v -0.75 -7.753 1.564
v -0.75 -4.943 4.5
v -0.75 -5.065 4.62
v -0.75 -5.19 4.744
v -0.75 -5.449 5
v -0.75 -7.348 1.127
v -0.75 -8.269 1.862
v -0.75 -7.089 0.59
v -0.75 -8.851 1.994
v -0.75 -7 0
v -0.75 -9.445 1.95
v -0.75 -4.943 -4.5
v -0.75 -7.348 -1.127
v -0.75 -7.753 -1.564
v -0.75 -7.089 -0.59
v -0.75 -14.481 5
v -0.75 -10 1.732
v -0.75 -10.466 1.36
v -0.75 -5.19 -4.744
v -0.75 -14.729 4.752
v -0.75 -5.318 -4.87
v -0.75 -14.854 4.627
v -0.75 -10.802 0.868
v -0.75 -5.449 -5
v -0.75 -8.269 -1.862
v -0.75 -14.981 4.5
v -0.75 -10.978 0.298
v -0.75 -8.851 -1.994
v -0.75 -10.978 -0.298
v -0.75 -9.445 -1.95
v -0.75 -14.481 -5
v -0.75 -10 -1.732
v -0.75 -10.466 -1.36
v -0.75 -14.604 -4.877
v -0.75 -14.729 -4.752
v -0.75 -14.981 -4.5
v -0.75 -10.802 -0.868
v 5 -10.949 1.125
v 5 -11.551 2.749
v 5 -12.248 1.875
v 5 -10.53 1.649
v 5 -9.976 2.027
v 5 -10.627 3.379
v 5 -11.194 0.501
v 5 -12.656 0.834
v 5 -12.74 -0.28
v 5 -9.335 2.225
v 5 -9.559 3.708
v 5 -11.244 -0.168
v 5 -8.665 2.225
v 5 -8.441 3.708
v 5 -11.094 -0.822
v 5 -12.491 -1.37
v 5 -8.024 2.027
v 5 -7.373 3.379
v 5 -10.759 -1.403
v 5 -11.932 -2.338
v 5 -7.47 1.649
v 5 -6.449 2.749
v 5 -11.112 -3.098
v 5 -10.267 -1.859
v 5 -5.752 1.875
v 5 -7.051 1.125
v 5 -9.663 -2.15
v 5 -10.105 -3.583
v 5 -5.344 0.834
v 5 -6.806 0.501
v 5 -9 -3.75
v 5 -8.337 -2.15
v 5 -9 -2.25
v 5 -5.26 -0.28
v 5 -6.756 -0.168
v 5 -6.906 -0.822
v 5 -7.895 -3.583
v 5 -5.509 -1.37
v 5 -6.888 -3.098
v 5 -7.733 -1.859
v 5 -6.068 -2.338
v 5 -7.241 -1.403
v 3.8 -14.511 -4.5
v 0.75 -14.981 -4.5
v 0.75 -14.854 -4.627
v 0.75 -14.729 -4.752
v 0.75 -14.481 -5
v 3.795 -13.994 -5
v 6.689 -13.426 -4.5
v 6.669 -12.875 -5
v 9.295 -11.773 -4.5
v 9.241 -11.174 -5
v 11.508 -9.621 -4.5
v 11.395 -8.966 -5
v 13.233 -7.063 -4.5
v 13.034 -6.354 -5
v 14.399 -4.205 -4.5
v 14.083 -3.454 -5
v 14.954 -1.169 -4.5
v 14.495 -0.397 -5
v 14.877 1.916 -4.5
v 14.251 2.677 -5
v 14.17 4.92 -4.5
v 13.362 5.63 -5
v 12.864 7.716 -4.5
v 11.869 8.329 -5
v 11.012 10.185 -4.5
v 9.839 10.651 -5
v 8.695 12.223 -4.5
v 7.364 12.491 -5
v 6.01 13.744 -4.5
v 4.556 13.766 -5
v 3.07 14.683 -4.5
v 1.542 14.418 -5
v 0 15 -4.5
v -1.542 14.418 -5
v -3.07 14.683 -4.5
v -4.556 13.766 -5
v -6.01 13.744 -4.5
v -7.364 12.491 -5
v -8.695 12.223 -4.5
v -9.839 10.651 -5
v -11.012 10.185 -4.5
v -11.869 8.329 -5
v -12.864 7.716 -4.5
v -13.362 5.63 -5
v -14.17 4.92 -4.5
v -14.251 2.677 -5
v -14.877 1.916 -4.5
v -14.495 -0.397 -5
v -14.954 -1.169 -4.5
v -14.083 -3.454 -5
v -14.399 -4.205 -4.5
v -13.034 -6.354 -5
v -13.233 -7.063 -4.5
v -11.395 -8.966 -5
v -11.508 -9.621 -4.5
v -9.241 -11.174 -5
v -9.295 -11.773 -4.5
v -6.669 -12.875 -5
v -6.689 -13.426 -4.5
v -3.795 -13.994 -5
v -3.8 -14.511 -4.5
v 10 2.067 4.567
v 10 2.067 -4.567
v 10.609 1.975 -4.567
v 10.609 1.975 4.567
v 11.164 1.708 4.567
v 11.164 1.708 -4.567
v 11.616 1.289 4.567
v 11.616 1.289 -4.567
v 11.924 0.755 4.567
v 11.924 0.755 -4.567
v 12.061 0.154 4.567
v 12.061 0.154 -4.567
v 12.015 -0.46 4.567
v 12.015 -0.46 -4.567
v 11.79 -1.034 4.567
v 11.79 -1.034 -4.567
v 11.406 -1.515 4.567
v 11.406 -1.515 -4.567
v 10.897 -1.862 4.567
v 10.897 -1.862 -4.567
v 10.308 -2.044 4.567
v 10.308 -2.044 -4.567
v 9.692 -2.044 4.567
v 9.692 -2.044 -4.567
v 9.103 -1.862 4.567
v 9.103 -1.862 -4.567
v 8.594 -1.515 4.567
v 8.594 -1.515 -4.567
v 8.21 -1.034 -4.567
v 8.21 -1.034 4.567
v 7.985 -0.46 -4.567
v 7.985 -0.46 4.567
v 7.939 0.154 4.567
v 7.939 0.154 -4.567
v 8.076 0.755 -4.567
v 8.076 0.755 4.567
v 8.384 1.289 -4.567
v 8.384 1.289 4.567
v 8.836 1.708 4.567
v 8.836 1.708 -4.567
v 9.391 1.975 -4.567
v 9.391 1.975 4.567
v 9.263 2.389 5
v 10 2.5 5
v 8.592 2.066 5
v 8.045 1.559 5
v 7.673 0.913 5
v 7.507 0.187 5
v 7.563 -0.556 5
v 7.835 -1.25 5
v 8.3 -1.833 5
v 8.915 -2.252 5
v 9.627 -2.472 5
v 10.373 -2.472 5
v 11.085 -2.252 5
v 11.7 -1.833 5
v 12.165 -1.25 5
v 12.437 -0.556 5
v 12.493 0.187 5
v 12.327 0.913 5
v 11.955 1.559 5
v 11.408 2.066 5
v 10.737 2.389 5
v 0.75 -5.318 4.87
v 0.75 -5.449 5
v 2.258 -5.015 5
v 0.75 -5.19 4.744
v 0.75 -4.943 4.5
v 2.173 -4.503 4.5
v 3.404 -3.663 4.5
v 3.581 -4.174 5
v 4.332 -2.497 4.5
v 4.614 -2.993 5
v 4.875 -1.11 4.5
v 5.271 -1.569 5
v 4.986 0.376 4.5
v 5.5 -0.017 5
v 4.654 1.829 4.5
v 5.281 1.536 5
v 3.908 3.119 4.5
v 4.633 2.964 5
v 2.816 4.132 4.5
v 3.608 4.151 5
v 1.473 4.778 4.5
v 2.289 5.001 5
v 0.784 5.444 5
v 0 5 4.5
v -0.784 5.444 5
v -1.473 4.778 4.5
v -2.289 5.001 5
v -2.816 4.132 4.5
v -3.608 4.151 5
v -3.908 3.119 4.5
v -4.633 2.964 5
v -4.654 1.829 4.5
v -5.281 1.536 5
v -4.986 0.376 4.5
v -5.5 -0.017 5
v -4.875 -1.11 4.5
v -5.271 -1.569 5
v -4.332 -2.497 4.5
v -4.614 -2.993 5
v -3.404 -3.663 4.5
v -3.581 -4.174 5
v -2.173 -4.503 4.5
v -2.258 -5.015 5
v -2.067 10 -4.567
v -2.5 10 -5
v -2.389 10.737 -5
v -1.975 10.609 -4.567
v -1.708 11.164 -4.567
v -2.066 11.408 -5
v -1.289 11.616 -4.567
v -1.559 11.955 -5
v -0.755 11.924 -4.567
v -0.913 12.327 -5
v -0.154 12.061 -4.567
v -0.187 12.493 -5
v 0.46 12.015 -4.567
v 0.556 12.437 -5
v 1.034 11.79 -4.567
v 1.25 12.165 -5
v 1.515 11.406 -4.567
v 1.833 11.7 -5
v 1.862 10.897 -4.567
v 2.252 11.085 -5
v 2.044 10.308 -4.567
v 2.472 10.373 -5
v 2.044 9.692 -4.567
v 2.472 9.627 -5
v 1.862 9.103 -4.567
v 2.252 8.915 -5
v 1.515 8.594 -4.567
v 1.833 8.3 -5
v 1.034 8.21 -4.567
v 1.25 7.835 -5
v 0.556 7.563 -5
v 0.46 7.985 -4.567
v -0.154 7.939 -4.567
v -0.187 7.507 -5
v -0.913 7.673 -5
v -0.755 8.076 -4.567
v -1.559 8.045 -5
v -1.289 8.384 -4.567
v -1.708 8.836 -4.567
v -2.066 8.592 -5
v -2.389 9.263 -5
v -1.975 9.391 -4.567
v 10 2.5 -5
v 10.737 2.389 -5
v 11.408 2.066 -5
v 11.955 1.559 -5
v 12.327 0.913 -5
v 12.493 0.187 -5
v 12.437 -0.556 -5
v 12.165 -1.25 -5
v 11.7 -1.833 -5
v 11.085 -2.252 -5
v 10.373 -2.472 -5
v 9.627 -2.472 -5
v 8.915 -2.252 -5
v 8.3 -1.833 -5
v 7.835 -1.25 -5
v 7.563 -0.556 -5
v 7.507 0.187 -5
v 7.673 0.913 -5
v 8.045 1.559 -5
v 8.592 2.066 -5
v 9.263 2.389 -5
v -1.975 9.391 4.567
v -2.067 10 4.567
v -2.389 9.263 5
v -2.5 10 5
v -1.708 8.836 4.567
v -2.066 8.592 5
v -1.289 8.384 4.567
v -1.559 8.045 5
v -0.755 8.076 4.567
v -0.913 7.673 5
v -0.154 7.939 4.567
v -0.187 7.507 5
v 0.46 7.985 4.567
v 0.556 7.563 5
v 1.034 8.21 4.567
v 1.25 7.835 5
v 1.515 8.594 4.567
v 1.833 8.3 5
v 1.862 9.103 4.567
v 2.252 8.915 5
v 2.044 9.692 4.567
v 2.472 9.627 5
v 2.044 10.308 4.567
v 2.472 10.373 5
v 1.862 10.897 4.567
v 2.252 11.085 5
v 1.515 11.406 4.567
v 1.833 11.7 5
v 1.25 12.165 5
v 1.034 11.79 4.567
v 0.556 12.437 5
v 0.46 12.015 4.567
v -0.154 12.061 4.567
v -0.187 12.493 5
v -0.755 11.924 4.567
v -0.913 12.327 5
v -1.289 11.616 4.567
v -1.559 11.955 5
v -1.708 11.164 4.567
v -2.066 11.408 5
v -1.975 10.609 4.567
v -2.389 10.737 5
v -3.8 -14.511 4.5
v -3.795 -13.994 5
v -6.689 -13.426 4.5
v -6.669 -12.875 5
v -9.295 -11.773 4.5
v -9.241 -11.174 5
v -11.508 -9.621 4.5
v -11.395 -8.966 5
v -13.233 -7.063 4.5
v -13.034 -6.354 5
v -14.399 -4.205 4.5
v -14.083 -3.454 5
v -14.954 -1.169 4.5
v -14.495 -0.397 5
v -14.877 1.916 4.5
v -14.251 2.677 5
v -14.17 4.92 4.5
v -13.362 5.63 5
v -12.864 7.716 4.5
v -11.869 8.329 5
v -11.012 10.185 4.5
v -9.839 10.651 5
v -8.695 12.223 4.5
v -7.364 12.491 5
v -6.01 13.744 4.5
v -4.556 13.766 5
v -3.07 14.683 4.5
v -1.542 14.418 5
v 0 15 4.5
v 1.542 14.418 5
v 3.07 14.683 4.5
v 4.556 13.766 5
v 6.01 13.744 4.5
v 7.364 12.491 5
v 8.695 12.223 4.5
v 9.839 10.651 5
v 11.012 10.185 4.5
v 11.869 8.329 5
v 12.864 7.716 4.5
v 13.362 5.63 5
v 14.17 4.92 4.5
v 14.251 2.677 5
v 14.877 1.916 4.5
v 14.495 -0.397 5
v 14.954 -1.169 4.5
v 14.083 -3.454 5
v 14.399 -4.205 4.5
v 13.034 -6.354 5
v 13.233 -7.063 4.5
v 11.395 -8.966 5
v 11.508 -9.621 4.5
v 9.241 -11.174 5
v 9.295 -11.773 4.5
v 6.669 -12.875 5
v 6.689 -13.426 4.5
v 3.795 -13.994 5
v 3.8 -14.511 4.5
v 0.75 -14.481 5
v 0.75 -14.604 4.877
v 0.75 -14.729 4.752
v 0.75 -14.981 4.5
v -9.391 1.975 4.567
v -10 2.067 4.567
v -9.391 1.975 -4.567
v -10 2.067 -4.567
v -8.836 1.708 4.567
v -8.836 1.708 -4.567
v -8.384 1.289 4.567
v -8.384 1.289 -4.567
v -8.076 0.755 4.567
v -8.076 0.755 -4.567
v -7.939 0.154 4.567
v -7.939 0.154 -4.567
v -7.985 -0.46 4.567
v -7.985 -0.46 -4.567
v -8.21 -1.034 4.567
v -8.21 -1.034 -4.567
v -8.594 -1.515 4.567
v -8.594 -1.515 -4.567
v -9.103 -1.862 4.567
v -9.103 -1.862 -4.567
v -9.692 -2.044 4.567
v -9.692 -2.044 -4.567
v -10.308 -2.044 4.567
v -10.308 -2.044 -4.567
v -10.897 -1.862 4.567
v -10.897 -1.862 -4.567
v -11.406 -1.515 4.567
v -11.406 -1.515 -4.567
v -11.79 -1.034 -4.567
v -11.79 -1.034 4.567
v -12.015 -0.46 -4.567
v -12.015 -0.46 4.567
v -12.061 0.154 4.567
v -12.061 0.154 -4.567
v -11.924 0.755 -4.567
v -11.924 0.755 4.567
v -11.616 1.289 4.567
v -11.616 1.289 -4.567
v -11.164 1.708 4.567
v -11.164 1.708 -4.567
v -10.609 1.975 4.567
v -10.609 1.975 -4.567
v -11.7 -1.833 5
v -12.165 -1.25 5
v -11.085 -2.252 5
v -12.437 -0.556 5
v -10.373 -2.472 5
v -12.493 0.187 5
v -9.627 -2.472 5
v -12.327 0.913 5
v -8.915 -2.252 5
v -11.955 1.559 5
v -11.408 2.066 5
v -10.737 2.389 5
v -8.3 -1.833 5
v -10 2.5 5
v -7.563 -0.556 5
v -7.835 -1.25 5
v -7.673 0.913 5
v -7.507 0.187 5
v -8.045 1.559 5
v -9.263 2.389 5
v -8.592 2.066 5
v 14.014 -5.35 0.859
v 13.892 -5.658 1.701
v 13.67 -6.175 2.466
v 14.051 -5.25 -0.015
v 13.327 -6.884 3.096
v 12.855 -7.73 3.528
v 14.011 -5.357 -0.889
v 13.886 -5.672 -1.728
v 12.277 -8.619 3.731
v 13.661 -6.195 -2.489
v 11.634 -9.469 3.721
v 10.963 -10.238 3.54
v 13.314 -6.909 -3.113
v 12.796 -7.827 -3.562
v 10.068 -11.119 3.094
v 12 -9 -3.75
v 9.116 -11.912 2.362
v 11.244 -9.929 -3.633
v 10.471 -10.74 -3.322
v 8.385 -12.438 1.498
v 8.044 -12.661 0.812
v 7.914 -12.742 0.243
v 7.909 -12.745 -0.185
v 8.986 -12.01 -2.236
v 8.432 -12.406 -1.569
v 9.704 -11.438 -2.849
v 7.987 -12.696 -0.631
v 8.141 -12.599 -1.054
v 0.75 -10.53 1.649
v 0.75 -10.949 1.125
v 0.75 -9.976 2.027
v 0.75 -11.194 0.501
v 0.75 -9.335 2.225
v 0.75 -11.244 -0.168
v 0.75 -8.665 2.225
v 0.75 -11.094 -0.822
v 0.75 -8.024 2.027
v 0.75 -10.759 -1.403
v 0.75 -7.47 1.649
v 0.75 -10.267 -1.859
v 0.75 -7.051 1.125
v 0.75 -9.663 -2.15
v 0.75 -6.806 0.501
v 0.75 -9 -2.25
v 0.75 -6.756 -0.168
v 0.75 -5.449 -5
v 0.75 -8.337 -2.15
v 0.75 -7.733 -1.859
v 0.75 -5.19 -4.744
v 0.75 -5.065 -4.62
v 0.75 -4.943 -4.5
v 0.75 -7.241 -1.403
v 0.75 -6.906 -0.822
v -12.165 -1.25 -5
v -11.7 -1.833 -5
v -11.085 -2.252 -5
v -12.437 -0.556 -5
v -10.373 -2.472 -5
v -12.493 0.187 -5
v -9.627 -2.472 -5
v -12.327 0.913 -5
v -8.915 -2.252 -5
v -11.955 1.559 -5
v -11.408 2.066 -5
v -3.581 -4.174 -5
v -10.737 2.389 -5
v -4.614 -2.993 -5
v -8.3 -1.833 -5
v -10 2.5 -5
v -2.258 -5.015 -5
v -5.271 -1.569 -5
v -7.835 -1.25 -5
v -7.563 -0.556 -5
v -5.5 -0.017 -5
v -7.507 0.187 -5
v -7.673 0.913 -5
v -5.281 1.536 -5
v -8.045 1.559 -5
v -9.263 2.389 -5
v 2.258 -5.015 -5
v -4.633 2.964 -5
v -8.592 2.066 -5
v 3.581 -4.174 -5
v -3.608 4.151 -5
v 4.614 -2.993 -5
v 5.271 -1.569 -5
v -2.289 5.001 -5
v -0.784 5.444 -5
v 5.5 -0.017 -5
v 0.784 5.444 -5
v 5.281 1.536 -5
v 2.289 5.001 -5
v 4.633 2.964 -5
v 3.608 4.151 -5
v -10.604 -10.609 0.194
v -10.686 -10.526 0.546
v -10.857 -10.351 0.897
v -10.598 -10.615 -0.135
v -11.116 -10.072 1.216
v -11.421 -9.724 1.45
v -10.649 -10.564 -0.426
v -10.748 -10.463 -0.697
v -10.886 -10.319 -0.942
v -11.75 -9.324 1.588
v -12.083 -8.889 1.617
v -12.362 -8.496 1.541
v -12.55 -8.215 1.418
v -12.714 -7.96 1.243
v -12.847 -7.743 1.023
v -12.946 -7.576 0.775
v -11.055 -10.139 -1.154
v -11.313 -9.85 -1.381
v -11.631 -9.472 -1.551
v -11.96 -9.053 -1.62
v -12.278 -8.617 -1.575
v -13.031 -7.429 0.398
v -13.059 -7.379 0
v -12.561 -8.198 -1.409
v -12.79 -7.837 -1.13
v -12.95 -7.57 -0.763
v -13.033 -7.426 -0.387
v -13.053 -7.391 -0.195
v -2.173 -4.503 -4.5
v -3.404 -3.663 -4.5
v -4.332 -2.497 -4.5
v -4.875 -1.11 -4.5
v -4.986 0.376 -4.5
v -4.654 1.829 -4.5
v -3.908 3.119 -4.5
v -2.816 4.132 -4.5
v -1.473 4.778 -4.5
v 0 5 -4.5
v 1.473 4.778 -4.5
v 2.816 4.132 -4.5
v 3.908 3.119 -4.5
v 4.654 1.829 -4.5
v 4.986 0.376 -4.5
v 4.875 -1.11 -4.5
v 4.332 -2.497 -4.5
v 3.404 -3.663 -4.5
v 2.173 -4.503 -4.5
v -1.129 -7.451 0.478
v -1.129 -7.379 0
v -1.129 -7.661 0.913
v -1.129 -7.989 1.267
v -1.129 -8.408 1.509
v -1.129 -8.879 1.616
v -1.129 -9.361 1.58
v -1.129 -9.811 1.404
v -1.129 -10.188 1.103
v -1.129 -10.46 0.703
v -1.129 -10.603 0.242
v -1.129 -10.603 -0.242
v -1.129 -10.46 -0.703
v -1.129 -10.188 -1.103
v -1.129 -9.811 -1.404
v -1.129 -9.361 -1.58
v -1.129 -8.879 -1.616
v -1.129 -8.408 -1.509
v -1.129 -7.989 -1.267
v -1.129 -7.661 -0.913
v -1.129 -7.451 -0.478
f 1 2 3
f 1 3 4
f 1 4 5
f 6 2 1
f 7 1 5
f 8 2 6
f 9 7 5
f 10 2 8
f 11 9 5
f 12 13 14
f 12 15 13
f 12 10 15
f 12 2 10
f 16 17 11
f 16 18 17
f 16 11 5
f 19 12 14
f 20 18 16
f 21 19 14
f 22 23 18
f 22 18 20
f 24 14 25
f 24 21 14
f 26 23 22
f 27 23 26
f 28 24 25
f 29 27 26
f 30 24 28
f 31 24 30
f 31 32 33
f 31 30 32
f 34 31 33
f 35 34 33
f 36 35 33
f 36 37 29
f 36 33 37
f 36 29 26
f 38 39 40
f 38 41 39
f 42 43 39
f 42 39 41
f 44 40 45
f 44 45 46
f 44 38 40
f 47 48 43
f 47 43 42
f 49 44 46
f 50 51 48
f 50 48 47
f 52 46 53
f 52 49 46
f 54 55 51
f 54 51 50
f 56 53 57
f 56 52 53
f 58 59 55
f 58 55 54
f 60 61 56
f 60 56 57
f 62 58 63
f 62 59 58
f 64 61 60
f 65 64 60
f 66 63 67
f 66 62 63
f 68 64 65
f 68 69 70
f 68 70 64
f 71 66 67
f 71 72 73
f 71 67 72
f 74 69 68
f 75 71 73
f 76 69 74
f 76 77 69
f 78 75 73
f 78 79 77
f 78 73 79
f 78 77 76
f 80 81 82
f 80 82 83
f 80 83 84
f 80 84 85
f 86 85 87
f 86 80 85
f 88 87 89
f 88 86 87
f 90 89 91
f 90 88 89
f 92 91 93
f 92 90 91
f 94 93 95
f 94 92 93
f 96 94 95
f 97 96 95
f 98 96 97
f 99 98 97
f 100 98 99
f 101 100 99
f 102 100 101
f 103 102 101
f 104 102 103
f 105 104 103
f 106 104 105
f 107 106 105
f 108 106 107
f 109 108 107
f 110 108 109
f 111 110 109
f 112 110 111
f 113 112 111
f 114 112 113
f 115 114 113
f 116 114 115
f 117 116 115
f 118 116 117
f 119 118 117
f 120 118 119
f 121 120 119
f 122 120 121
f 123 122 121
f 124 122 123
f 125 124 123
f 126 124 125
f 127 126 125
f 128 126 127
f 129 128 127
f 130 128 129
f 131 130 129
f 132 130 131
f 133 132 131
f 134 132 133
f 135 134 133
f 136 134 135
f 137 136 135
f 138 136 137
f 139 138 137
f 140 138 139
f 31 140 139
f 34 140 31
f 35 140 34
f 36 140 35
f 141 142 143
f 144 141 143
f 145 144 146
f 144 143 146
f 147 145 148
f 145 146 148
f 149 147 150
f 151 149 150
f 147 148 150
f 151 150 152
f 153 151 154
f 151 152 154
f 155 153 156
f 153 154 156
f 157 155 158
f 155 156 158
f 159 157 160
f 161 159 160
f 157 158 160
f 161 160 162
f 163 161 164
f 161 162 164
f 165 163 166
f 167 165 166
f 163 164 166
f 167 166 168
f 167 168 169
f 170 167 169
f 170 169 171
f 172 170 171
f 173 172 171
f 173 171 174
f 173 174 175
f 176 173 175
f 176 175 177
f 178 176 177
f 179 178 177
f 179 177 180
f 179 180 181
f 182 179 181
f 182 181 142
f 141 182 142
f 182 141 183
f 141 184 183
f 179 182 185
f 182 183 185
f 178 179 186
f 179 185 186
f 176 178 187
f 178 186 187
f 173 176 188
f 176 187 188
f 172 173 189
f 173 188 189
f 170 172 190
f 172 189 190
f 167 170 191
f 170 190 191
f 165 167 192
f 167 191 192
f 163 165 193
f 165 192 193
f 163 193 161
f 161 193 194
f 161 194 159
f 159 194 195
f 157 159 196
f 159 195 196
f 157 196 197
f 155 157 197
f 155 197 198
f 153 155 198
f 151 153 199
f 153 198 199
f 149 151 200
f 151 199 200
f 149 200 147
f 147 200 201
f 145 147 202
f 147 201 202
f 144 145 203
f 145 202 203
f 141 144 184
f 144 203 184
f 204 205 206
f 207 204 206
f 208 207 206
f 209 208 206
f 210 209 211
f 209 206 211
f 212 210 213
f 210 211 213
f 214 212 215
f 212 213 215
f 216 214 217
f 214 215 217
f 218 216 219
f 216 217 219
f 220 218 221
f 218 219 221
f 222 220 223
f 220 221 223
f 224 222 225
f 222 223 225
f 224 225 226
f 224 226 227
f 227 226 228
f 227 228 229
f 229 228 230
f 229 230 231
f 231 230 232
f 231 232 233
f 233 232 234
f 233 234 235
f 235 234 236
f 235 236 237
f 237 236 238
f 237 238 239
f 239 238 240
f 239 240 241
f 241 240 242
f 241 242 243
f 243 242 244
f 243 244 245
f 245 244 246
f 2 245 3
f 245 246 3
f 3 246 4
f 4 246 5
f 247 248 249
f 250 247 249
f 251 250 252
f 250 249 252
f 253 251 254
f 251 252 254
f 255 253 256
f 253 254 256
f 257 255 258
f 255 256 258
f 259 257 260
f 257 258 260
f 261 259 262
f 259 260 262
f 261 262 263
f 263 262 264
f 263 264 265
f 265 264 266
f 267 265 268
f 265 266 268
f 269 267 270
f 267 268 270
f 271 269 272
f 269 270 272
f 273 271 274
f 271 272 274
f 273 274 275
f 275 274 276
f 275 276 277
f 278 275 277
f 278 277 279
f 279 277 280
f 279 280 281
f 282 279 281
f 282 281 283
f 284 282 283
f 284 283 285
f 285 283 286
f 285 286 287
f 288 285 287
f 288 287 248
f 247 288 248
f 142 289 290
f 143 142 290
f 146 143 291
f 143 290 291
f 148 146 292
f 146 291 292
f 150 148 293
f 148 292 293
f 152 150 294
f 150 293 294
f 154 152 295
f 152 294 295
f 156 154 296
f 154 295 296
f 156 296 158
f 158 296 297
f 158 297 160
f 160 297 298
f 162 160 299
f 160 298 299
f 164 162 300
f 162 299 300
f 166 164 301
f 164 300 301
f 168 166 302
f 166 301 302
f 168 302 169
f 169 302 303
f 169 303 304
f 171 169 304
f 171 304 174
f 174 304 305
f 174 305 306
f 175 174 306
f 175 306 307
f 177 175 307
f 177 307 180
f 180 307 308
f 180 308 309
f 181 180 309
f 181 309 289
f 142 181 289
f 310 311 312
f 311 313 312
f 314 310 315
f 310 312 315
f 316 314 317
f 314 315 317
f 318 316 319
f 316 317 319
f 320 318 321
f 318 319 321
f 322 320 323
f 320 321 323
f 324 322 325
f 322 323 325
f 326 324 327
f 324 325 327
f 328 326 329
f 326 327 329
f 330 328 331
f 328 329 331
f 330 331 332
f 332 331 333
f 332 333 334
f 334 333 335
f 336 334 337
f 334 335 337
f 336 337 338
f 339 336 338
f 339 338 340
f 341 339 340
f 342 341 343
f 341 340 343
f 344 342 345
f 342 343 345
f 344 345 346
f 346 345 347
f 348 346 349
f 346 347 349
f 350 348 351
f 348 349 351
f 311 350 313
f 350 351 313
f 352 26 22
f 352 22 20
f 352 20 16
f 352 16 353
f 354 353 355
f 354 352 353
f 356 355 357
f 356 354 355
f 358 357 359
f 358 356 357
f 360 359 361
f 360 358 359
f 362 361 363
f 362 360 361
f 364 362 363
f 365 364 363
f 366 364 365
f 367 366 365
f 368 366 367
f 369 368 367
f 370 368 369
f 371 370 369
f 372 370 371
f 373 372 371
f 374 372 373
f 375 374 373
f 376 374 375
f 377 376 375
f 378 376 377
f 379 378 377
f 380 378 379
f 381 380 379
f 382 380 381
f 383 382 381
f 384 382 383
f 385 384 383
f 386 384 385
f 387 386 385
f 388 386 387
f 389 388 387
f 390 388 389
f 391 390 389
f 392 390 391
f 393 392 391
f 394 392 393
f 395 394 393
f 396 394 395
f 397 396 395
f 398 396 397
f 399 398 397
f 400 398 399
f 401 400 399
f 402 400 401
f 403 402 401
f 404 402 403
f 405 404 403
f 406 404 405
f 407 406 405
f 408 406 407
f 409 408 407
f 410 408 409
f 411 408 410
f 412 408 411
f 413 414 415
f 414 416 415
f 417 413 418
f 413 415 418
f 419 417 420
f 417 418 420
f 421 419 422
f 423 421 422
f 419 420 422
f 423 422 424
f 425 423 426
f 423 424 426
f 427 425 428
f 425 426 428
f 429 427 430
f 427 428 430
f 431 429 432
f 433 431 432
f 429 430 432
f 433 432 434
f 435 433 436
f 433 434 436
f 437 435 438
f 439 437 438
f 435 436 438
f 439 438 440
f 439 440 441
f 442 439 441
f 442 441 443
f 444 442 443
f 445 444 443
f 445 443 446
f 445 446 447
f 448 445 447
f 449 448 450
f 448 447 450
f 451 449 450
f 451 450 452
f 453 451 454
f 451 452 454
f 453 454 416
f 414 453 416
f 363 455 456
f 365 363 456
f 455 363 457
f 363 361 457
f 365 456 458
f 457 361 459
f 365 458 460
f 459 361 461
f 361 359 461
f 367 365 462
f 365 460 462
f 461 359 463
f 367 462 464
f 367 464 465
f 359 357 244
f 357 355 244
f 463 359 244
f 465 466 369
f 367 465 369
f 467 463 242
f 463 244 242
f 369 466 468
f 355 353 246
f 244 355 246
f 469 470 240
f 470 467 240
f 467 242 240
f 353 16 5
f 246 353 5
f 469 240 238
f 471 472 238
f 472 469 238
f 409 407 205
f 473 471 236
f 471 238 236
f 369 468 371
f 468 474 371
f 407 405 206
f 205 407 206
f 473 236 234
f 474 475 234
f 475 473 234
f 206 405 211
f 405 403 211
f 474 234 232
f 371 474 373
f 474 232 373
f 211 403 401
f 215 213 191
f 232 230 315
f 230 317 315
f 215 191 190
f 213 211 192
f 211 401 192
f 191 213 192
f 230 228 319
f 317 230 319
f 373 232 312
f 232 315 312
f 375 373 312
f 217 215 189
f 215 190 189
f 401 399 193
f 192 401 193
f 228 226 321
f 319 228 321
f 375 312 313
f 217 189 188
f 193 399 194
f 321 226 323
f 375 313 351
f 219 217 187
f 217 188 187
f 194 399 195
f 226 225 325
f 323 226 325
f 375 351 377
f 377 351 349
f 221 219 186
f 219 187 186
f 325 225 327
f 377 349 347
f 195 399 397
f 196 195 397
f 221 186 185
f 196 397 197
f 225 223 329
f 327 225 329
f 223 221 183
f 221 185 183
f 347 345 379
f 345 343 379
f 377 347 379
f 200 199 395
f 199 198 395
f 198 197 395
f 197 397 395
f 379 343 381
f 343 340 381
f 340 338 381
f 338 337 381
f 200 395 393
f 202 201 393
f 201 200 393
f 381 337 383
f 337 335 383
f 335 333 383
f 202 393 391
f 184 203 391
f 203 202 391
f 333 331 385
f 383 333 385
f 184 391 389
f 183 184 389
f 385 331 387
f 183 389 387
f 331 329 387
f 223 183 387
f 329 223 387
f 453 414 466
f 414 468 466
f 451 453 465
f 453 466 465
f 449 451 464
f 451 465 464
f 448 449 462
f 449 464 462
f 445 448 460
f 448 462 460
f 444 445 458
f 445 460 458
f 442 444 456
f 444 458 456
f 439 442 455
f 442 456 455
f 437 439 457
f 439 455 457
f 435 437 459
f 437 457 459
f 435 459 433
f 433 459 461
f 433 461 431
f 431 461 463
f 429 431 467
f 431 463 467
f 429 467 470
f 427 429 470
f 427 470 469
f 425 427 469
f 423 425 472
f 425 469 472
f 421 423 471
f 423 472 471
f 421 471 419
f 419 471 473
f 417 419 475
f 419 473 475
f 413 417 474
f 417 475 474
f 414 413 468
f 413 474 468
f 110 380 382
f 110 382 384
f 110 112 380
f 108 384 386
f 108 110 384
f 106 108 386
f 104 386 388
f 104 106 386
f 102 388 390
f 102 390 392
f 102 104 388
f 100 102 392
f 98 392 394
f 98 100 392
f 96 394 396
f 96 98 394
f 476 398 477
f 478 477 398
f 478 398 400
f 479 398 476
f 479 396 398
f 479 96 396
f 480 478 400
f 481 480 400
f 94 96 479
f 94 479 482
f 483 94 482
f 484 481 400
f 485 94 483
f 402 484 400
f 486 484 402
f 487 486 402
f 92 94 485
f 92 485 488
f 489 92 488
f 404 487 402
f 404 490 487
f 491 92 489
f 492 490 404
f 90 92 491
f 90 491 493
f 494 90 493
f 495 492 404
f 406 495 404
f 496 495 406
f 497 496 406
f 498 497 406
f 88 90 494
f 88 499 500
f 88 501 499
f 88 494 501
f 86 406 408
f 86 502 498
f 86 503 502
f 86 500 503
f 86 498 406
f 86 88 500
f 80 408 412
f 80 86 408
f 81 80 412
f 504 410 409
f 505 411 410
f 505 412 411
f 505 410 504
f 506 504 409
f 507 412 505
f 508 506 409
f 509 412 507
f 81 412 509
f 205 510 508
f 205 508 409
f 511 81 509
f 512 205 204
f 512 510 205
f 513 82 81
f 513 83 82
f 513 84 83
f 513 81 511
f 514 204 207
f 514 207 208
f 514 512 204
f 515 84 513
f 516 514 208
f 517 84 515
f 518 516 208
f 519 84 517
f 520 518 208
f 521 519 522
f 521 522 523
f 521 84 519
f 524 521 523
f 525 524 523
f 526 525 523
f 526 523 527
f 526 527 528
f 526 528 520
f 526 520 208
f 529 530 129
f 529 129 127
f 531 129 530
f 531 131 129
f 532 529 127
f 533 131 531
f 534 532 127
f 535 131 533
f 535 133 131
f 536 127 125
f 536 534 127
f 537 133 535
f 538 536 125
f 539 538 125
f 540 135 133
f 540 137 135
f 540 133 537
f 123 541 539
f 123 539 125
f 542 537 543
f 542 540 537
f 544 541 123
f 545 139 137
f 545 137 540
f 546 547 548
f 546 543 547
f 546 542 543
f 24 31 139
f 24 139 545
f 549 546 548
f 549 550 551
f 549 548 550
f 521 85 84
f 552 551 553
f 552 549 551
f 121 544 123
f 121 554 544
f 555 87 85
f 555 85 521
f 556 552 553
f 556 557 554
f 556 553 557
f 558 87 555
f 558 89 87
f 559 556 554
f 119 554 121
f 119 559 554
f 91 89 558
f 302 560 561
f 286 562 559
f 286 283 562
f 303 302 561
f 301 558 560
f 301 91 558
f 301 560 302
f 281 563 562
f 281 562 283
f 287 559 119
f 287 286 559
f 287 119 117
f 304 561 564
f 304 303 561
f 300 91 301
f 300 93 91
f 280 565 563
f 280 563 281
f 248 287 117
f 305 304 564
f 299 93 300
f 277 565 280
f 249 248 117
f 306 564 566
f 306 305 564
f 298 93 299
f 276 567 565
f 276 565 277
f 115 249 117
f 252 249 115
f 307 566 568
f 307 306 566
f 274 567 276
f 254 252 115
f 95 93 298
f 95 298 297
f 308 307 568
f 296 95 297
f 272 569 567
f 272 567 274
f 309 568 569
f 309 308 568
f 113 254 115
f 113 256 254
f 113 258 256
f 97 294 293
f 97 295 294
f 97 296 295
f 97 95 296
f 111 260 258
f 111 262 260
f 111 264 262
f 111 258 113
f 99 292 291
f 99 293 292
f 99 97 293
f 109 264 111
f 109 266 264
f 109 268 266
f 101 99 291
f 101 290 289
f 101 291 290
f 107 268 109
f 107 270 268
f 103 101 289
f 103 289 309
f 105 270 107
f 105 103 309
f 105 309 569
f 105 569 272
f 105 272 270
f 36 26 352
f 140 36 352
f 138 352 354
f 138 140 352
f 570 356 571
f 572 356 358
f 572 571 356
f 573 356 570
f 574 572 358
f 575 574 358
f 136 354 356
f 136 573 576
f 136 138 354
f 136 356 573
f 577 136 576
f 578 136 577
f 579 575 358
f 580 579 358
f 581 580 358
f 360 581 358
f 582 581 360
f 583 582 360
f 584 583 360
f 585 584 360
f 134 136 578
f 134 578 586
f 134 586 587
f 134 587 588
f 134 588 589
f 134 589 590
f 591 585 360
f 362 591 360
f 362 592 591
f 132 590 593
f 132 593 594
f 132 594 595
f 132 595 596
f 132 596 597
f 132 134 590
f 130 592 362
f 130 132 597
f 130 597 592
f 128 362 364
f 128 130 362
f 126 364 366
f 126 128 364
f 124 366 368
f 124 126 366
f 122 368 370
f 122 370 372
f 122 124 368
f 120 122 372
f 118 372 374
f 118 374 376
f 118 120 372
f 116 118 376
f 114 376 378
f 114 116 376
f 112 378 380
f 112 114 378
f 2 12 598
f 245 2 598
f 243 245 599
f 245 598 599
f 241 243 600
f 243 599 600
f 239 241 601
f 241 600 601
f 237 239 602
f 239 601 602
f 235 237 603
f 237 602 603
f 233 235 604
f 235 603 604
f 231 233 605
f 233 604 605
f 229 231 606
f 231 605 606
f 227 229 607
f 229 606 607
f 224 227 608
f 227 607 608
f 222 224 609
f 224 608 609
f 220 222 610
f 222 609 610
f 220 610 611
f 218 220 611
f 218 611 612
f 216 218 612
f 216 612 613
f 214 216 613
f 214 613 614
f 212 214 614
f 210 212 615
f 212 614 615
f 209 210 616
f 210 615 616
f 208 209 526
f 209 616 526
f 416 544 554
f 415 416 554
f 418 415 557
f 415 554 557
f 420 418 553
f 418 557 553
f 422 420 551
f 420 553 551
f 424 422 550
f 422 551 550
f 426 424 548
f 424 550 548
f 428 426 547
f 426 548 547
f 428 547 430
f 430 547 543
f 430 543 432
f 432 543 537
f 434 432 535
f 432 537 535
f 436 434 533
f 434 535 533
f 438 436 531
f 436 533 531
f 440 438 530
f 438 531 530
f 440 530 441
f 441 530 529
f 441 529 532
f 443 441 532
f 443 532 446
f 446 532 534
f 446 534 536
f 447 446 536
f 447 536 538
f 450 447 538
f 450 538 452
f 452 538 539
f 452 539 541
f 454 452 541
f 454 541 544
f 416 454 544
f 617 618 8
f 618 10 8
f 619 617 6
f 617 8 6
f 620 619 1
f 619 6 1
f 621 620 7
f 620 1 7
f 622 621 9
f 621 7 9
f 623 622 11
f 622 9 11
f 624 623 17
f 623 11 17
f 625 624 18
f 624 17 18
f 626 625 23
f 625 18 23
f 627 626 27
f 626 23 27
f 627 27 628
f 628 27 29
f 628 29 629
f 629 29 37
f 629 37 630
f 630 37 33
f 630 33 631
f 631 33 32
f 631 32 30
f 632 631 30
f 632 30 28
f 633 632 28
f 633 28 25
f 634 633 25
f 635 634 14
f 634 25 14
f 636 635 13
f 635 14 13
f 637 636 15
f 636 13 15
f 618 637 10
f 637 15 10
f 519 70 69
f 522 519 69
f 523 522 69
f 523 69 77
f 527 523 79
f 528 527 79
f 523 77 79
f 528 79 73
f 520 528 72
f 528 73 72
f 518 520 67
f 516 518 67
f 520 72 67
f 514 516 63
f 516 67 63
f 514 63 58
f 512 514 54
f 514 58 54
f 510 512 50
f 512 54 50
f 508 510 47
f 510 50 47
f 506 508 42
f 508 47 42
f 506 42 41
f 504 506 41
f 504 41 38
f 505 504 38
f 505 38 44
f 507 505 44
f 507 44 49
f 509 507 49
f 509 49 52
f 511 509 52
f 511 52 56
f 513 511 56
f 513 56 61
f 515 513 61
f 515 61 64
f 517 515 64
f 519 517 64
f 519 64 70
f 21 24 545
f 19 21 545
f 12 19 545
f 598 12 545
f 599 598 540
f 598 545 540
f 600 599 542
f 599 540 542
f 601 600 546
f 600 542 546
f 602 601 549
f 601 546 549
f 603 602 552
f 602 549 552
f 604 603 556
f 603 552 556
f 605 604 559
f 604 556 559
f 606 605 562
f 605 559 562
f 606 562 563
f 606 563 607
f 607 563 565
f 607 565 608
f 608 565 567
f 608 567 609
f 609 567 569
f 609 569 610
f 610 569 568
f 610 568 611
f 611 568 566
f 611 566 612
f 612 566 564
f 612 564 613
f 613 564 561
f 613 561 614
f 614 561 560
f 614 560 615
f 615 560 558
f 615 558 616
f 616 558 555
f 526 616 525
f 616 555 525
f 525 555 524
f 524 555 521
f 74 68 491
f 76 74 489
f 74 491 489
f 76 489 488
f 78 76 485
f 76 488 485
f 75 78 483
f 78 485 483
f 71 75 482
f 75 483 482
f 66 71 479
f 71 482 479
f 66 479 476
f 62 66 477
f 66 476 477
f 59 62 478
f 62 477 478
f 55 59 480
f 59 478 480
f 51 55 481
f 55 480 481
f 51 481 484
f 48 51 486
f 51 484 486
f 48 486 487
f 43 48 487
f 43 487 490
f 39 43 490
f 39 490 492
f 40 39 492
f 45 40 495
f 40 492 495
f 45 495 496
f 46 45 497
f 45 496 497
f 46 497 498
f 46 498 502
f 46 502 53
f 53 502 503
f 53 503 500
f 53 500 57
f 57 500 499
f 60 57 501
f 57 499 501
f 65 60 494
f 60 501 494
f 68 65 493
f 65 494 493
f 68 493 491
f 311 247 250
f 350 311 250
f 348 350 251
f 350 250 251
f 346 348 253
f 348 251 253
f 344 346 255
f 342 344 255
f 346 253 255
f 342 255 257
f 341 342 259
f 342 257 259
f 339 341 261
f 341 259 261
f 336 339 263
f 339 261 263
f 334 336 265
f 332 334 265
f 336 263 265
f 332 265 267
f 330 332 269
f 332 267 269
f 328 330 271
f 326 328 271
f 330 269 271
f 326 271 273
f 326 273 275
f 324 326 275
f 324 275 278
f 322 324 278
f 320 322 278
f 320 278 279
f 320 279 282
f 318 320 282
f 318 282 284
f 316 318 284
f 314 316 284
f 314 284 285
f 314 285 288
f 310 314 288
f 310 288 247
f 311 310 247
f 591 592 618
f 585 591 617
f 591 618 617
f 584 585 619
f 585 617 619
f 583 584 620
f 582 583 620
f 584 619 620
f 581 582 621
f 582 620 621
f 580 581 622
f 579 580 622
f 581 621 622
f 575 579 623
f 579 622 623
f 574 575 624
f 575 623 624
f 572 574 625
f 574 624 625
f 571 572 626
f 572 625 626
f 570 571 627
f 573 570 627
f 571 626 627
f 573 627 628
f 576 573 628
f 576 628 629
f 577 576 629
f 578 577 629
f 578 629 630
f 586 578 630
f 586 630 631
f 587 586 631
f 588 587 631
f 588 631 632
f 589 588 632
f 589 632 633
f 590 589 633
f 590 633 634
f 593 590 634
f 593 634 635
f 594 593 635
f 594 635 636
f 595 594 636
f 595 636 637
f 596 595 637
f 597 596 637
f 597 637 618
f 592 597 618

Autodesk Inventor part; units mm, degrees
sketch "Sketch_14" plane through (0, 0, 0) normal (1, 0, 0) x (0, 1, 0)
  line L0 (0, -5) -> (0, 5)
  line L1 (0, 5) -> (14.5, 5)
  line L2 (14.5, 5) -> (15, 4.5)
  line L3 (15, 4.5) -> (15, -4.5)
  line L4 (15, -4.5) -> (14.5, -5)
  line L5 (14.5, -5) -> (0, -5)
  line L6 (0, -5) -> (0, 5)
revolve "Revolution1" add sketch "Sketch_14" angle 360 about axis through (0, 0, -5) along (0, 0, -1)
sketch "Sketch_15" plane through (0, 0, 0) normal (1, 0, 0) x (0, 1, 0)
  line L0 (0, -5) -> (0, 5)
  line L1 (0, 5) -> (5.5, 5)
  line L2 (5.5, 5) -> (5, 4.5)
  line L3 (5, 4.5) -> (5, -4.5)
  line L4 (5, -4.5) -> (5.5, -5)
  line L5 (5.5, -5) -> (0, -5)
  line L6 (0, -5) -> (0, 5)
revolve "Revolution2" cut sketch "Sketch_15" angle 360 about axis through (0, 0, -5) along (0, 0, -1)
sketch "Sketch_16" plane through (0, 0, 0) normal (0, 0, 1) x (1, 0, 0)
  arc A0 (-0.75, -15.9824) -> (0.75, -15.9824) centre (0, 0) ccw
  line L0 (0.75, -15.9824) -> (0.75, 0)
  line L1 (0.75, 0) -> (-0.75, 0)
  line L2 (-0.75, 0) -> (-0.75, -15.9824)
extrude "Extrusion1" cut sketch "Sketch_16" along normal mid plane 10
sketch "Sketch_18" plane through (10, 0, 0) normal (1, 0, 0) x (0, 0, -1)
  line L0 (5, 0) -> (-5, 0)
  line L1 (-5, 0) -> (-5, 2.5)
  line L2 (-5, 2.5) -> (-4.567, 2.067)
  line L3 (-4.567, 2.067) -> (4.567, 2.067)
  line L4 (4.567, 2.067) -> (5, 2.5)
  line L5 (5, 2.5) -> (5, 0)
  line L6 (5, 0) -> (-5, 0)
revolve "Revolution3" cut sketch "Sketch_18" angle 360 about axis through (10, 0, -5) along (0, 0, -1)
thread "Thread1" size "M5x0.8" class "6H" standard "ISO Metric profile" full length
sketch "Sketch_20" plane through (-10, 0, 0) normal (1, 0, 0) x (0, 0, -1)
  line L0 (5, 0) -> (-5, 0)
  line L1 (-5, 0) -> (-5, 2.5)
  line L2 (-5, 2.5) -> (-4.567, 2.067)
  line L3 (-4.567, 2.067) -> (4.567, 2.067)
  line L4 (4.567, 2.067) -> (5, 2.5)
  line L5 (5, 2.5) -> (5, 0)
  line L6 (5, 0) -> (-5, 0)
revolve "Revolution4" cut sketch "Sketch_20" angle 360 about axis through (-10, 0, -5) along (0, 0, -1)
thread "Thread2" size "M5x0.8" class "6H" standard "ISO Metric profile" full length
sketch "Sketch_22" plane through (0, 10, 0) normal (0, 1, 0) x (1, 0, 0)
  line L0 (0, 5) -> (0, -5)
  line L1 (0, -5) -> (-2.5, -5)
  line L2 (-2.5, -5) -> (-2.067, -4.567)
  line L3 (-2.067, -4.567) -> (-2.067, 4.567)
  line L4 (-2.067, 4.567) -> (-2.5, 5)
  line L5 (-2.5, 5) -> (0, 5)
  line L6 (0, 5) -> (0, -5)
revolve "Revolution5" cut sketch "Sketch_22" angle 360 about axis through (0, 10, -5) along (0, 0, -1)
thread "Thread3" size "M5x0.8" class "6H" standard "ISO Metric profile" full length
sketch "Sketch_23" plane through (0, -9, 0) normal (0, 1, 0) x (1, 0, 0)
  line L0 (15, 0) -> (0, 0)
  line L1 (0, 0) -> (0, 2.25)
  line L2 (0, 2.25) -> (5, 2.25)
  line L3 (5, 2.25) -> (5, 3.75)
  line L4 (5, 3.75) -> (15, 3.75)
  line L5 (15, 3.75) -> (15, 0)
  line L6 (15, 0) -> (0, 0)
revolve "Revolution6" cut sketch "Sketch_23" angle 360 about axis through (15, -9, 0) along (1, 0, 0)
sketch "Sketch_25" plane through (0, 0, 0) normal (0, 0, 1) x (1, 0, 0)
  line L0 (-0.75, -9) -> (-13.2665, -9)
  line L1 (-13.2665, -9) -> (-13.2665, -7.379)
  line L2 (-13.2665, -7.379) -> (-1.129, -7.379)
  line L3 (-1.129, -7.379) -> (-0.75, -7)
  line L4 (-0.75, -7) -> (-0.75, -9)
  line L5 (-0.75, -9) -> (-13.2665, -9)
revolve "Revolution7" cut sketch "Sketch_25" angle 360 about axis through (-0.75, -9, 0) along (1, 0, 0)
thread "Thread4" size "M4x0.7" class "6H" standard "ISO Metric profile" length 12.1375
ref_plane "to_bolt_XY" through (5, -9, 0) normal (1, 0, 0) x (0, 0, -1)
ref_plane "to_bolt_YZ" through (5, -9, 0) normal (0, 0, -1) x (0, 1, 0)
ref_plane "to_bolt_ZX" through (5, -9, 0) normal (0, 1, 0) x (1, 0, 0)
properties part number "SCSTR10-10b" material "鋼、炭素鋼"
